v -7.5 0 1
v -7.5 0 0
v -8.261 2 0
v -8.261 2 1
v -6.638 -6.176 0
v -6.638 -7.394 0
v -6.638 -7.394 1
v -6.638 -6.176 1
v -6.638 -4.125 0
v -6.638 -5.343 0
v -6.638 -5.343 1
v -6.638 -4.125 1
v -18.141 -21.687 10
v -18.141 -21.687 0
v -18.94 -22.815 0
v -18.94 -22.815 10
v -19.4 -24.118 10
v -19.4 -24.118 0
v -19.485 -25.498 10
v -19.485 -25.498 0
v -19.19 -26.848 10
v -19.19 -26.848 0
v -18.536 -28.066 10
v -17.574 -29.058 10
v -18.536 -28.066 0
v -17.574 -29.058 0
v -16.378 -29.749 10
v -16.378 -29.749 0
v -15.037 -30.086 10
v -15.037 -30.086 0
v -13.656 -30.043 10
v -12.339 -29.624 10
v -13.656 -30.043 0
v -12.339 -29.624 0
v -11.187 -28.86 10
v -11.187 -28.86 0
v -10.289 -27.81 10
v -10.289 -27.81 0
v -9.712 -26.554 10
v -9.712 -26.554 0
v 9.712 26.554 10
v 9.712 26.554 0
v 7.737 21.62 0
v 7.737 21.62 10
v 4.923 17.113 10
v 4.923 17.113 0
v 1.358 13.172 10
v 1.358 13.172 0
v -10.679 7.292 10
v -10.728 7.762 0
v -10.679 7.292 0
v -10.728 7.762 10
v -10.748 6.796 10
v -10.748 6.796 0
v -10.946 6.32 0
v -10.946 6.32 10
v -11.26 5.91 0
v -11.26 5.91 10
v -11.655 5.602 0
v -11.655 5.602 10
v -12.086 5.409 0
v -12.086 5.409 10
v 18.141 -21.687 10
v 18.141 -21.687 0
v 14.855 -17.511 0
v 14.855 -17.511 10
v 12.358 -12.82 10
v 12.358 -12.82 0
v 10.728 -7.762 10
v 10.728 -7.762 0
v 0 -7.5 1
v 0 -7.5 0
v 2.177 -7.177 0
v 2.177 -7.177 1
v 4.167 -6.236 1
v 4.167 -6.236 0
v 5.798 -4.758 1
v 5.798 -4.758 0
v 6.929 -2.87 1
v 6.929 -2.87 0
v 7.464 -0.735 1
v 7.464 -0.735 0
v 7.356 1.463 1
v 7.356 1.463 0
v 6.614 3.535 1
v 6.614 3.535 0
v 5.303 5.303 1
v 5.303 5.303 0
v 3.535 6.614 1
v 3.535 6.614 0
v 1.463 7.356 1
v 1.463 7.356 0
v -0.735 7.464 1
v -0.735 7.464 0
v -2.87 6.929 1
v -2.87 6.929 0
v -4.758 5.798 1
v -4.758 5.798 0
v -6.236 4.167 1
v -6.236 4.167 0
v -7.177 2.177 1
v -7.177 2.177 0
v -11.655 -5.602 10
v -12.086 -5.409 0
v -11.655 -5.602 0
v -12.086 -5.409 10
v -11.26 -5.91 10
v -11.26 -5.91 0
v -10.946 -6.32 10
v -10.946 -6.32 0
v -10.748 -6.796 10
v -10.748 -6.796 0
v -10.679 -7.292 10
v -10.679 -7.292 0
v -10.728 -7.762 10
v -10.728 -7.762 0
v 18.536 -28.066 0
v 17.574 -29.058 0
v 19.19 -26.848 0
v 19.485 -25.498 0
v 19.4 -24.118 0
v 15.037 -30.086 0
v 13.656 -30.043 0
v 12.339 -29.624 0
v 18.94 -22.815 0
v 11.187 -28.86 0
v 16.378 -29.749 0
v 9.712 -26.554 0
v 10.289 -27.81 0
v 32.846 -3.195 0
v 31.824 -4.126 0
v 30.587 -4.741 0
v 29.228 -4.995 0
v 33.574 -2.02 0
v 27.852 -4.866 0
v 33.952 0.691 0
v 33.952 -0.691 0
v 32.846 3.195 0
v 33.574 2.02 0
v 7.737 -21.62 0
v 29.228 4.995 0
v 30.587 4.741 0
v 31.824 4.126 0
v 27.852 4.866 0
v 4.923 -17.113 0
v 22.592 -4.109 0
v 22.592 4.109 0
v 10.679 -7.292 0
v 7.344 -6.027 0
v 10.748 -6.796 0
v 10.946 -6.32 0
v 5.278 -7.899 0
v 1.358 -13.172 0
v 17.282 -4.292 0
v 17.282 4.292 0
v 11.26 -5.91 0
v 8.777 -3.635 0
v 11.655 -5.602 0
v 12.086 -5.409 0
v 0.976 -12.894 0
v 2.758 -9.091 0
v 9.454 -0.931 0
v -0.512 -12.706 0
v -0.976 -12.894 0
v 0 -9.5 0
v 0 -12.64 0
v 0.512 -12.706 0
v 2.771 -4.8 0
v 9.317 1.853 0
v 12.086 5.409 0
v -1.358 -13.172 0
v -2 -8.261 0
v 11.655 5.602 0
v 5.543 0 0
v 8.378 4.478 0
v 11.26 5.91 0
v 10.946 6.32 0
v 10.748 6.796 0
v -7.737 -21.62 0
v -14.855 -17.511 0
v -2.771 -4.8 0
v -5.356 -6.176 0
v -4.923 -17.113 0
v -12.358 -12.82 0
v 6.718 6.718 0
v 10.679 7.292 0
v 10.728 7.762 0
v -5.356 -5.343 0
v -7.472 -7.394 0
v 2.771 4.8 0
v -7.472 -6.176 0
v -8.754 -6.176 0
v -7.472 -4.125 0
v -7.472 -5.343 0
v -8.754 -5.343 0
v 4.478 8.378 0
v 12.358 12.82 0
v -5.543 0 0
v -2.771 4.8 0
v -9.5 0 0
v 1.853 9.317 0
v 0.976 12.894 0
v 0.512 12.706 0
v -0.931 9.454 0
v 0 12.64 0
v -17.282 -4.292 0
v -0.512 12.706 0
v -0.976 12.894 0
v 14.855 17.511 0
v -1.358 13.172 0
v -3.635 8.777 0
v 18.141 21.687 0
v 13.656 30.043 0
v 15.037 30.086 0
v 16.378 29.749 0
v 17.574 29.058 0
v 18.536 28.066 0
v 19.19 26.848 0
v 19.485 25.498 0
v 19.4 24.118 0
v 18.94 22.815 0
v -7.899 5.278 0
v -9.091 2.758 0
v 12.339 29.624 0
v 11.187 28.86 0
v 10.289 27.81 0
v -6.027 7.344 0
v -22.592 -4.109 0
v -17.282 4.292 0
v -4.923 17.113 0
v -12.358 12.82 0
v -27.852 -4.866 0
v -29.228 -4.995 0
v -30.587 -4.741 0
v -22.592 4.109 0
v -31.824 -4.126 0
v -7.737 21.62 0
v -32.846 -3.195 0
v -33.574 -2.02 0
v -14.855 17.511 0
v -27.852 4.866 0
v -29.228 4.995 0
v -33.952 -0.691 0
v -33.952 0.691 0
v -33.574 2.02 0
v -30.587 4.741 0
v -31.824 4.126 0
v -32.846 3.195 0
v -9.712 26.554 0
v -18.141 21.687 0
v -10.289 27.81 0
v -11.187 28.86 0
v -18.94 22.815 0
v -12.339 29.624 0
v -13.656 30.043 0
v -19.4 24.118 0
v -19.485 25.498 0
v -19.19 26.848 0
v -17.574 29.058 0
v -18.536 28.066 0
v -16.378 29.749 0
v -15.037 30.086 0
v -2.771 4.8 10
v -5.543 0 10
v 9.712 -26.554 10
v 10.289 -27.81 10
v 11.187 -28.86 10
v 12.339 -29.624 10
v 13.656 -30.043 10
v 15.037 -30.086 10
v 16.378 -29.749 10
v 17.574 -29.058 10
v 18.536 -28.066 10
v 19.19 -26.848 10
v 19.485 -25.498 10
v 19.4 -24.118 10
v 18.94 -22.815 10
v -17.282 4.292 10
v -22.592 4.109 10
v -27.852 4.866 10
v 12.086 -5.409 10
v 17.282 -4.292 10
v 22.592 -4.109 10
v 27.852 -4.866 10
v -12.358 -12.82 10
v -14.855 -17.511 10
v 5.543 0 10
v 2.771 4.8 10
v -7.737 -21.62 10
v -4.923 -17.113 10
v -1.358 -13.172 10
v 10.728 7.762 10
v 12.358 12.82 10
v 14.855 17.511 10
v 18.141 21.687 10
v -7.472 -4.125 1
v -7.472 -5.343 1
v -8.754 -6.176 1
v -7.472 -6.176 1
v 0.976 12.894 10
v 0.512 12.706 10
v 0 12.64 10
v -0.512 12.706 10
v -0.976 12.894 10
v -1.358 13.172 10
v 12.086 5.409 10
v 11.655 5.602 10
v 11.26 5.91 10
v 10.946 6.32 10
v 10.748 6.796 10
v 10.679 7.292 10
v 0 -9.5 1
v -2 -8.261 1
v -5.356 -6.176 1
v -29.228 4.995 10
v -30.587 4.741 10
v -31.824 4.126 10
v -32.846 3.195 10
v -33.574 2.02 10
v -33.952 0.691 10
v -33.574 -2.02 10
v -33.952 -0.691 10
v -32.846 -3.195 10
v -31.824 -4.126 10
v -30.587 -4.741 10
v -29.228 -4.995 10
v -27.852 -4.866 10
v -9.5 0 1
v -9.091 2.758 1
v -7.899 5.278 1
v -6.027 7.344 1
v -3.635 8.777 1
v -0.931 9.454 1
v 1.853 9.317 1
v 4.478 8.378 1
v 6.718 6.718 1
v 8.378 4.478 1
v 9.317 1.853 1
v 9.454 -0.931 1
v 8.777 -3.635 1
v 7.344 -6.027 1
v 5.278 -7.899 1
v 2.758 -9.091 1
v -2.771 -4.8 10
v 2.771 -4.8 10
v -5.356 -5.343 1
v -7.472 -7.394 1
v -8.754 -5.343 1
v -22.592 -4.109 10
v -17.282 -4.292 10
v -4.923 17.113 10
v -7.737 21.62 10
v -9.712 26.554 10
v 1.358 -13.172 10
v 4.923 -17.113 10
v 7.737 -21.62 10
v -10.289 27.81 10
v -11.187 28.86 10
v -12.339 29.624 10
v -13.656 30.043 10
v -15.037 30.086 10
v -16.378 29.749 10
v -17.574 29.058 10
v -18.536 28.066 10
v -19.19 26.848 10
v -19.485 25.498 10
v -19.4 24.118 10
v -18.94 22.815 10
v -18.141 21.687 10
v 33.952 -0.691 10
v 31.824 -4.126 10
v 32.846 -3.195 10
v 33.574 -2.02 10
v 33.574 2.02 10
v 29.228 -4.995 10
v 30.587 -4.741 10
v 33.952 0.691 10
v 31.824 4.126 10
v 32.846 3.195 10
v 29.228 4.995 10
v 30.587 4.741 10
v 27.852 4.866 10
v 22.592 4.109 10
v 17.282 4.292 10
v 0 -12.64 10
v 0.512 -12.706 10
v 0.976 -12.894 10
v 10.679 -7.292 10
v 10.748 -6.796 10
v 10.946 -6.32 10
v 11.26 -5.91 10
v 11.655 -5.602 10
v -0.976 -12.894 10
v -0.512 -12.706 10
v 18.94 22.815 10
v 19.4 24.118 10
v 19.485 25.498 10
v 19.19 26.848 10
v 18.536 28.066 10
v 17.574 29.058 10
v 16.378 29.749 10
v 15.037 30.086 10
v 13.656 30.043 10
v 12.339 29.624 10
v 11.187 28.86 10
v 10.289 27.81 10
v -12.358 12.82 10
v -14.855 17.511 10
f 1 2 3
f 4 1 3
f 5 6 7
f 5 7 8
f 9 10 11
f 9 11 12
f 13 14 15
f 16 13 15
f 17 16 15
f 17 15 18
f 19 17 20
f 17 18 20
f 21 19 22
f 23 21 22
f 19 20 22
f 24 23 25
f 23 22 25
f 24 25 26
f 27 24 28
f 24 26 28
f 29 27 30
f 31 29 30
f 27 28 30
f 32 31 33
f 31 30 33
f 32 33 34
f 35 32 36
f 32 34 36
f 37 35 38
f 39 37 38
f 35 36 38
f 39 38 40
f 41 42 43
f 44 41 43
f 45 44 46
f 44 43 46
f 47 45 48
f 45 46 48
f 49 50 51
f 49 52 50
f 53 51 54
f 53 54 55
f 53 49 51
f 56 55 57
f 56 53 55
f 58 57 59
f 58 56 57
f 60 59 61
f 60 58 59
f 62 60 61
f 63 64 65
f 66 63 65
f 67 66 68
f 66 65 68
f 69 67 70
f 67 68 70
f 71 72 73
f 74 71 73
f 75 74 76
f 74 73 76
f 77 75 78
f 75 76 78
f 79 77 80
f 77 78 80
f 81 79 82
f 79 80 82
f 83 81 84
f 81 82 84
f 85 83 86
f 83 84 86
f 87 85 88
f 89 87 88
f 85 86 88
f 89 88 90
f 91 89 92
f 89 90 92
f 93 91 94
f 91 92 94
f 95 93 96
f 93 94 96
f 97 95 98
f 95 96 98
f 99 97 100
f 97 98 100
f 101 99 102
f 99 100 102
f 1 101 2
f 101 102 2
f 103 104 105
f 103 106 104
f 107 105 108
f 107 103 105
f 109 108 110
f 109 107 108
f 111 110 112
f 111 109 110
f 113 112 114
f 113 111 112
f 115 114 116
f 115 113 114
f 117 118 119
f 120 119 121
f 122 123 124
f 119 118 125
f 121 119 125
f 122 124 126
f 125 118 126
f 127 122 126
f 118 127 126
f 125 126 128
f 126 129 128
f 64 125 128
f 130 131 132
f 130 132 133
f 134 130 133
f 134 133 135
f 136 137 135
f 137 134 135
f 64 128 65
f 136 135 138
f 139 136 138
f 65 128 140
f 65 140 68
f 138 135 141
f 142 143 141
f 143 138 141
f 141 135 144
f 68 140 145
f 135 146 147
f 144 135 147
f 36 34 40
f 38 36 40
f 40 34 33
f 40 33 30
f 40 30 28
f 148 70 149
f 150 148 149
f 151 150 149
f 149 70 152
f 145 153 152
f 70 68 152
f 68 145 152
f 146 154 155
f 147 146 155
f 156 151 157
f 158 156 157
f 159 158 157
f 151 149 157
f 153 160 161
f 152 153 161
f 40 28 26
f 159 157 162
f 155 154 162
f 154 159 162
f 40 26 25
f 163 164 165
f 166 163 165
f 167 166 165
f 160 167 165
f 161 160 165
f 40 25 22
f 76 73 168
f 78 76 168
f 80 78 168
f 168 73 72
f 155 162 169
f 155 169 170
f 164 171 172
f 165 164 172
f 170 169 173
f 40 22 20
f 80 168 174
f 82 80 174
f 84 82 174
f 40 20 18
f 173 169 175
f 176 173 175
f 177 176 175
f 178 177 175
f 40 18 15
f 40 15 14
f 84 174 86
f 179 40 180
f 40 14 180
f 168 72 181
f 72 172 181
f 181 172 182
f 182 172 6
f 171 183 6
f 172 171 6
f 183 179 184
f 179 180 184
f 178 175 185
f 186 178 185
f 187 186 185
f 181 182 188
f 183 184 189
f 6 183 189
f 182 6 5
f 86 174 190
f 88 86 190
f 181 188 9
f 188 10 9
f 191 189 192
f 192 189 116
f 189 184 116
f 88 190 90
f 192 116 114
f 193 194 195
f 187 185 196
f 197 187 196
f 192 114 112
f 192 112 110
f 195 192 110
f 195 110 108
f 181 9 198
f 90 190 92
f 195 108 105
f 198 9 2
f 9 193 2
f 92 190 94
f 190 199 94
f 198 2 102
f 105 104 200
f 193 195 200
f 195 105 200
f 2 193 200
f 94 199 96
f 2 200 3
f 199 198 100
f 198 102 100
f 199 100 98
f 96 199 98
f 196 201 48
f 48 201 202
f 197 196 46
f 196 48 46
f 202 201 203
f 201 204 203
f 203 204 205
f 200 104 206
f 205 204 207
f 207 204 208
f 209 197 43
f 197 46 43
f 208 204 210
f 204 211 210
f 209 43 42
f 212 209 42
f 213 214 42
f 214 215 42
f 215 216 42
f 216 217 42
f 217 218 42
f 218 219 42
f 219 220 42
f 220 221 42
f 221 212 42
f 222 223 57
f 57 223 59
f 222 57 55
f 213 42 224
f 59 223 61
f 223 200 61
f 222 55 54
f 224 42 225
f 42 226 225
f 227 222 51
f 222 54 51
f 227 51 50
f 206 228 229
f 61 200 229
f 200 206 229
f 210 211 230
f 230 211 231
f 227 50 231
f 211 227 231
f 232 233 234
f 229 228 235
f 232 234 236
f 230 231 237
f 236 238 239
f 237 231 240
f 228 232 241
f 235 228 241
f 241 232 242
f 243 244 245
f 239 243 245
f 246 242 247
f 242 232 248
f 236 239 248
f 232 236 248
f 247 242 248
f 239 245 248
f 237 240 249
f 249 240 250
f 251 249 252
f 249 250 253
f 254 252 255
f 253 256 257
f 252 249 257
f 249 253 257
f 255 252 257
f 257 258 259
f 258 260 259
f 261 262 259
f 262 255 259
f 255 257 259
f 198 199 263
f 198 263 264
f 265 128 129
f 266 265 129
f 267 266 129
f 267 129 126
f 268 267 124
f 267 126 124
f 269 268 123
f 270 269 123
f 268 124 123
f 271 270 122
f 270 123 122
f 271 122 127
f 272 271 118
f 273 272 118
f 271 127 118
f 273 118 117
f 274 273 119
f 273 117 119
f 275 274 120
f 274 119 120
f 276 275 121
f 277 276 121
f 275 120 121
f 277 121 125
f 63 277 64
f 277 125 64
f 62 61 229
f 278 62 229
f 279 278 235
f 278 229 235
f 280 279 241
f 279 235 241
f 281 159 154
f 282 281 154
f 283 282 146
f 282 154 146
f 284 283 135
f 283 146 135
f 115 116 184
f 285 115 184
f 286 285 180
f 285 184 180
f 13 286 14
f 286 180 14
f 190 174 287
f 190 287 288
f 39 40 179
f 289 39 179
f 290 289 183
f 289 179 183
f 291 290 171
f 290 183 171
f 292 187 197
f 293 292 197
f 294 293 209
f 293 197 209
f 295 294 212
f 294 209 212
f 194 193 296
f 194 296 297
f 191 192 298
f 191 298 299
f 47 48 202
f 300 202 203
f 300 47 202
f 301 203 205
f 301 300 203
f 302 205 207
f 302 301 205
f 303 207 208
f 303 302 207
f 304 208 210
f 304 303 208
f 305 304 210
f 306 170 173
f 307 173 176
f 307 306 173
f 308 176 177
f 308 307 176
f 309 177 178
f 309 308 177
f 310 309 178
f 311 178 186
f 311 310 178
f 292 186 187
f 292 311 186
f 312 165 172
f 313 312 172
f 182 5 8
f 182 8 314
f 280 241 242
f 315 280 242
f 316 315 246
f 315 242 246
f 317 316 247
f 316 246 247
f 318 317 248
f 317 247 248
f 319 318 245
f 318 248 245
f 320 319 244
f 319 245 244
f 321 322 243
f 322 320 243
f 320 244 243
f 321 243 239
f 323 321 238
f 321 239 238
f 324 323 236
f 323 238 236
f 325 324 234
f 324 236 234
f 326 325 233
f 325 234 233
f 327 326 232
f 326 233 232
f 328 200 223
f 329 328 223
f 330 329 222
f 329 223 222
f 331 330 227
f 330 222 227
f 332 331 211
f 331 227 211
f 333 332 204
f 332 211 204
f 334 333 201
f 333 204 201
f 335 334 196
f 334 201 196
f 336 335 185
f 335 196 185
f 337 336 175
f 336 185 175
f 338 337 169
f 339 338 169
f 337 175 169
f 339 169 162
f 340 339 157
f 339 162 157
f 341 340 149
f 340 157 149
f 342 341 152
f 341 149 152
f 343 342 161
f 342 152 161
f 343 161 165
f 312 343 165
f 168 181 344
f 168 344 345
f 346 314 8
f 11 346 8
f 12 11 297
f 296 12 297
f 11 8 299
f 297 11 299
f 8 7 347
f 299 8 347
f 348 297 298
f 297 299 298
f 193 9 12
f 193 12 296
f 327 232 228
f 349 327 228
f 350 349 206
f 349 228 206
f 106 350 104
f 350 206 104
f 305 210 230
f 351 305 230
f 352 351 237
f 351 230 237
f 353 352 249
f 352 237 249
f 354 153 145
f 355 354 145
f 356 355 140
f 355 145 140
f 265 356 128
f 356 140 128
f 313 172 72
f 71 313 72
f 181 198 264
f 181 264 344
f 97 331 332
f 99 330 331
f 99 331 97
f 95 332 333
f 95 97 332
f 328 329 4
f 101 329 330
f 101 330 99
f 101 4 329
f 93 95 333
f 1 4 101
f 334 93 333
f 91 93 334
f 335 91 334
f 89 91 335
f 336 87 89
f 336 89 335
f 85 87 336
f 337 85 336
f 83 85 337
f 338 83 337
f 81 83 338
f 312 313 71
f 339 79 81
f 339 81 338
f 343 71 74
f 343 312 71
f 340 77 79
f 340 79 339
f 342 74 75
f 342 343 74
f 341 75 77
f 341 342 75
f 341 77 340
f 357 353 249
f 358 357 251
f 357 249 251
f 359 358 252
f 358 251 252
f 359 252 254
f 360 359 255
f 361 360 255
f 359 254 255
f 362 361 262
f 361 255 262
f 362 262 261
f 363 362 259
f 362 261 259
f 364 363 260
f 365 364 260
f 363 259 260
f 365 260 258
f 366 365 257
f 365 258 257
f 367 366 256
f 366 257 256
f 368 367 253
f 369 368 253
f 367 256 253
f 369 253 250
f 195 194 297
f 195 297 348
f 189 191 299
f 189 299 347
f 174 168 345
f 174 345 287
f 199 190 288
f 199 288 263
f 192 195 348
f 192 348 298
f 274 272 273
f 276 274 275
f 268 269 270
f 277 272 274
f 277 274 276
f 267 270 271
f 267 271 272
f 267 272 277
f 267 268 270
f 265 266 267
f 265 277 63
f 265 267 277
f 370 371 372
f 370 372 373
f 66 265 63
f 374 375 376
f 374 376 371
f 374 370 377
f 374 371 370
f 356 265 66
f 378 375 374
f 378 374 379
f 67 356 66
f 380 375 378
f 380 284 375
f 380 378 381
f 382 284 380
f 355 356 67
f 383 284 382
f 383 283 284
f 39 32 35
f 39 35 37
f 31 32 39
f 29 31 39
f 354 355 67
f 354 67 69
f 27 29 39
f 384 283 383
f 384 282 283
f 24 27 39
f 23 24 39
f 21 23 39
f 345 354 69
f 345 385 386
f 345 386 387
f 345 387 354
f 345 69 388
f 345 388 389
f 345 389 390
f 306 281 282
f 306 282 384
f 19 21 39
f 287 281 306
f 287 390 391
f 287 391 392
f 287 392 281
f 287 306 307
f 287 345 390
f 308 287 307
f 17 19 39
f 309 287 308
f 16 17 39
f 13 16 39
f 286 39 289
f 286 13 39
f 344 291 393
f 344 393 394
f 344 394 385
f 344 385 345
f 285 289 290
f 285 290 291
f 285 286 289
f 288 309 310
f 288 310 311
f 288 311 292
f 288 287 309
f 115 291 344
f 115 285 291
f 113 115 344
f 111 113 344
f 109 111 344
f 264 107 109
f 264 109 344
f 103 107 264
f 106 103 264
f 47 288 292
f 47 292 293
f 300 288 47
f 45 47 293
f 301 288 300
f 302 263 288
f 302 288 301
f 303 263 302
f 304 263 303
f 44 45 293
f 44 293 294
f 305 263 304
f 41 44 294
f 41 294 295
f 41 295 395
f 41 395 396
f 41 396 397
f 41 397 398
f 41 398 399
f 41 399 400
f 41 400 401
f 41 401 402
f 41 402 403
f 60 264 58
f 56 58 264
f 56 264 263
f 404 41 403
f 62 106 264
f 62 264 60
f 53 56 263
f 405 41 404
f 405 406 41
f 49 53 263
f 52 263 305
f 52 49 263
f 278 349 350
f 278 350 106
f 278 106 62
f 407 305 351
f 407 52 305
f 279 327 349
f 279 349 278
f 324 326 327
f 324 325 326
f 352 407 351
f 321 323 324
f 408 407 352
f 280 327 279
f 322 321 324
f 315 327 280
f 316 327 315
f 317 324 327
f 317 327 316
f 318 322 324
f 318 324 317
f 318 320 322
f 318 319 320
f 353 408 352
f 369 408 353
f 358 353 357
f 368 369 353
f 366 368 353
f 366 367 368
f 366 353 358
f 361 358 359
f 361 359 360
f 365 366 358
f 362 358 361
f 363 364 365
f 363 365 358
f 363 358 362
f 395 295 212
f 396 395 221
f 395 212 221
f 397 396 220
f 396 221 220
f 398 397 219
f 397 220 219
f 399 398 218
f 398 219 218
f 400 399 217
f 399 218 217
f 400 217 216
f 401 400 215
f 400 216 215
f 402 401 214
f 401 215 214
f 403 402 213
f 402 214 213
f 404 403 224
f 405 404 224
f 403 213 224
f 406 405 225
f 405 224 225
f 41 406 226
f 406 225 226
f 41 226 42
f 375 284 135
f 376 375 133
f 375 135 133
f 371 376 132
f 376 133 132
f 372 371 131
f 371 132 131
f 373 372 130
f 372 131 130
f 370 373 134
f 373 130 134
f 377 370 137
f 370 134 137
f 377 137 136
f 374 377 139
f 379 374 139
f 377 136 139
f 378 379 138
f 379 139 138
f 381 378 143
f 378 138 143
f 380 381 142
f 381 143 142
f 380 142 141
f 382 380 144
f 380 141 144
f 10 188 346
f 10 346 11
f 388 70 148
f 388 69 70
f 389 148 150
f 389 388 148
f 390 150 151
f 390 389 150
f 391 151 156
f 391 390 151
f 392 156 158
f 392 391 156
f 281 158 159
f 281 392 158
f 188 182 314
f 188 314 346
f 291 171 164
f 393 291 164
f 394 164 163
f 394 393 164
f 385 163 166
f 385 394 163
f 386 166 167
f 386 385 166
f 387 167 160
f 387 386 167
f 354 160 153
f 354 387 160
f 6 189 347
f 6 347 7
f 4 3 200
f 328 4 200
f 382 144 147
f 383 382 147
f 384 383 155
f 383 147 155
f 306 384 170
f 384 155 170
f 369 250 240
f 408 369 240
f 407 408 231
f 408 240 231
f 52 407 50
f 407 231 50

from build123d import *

# Parameters (mm, degrees)
ESQUISSE1_R             = 5
ESQUISSE1_R_2           = 10
BOSS_EXTRU_1_DEPTH      = 10
CONG_1_R                = 2
ENL_V_MAT_EXTRU_1_DEPTH = 1


with BuildPart() as part:
    # Esquisse1 → Boss.-Extru.1 (new body)
    # profile 1 of 19: a face of its own
    with BuildSketch(Plane(origin=(0, 0, 0), x_dir=(0, 1, 0), z_dir=(0, 0, 1))):
        with Locations((0, -29)):
            Circle(ESQUISSE1_R)
    # profile 2 of 19: a face of its own
    with BuildSketch(Plane(origin=(0, 0, 0), x_dir=(0, 1, 0), z_dir=(0, 0, 1))):
        with BuildLine():
            ThreePointArc((5.99413543, -10.382147113), (3.146801004, -10.052477503), (0.281000689, -9.996051151))
            ThreePointArc((0.281000689, -9.996051151), (0, -10), (-0.281000689, -9.996051151))
            ThreePointArc((-0.281000689, -9.996051151), (-3.146801004, -10.052477503), (-5.99413543, -10.382147113))
            ThreePointArc((-5.99413543, -10.382147113), (-4.127637704, -19.033097235), (-4.866476509, -27.852216749))
            ThreePointArc((-4.866476509, -27.852216749), (0, -24), (4.866476509, -27.852216749))
            ThreePointArc((4.866476509, -27.852216749), (4.127637704, -19.033097235), (5.99413543, -10.382147113))
        make_face()
    # profile 3 of 19: a face of its own
    with BuildSketch(Plane(origin=(0, 0, 0), x_dir=(0, 1, 0), z_dir=(0, 0, 1))):
        with Locations((25.11473671, -14.5)):
            Circle(ESQUISSE1_R)
    # profile 4 of 19: a face of its own
    with BuildSketch(Plane(origin=(0, 0, 0), x_dir=(0, 1, 0), z_dir=(0, 0, 1))):
        with BuildLine():
            ThreePointArc((11.98827086, 0), (10.279101391, -2.301029141), (8.797334579, -4.754671841))
            ThreePointArc((8.797334579, -4.754671841), (8.660254038, -5), (8.51633389, -5.24137931))
            ThreePointArc((8.51633389, -5.24137931), (7.132300386, -7.751448362), (5.99413543, -10.382147113))
            ThreePointArc((5.99413543, -10.382147113), (14.419326866, -13.091187726), (21.687489002, -18.140600658))
            ThreePointArc((21.687489002, -18.140600658), (20.784609691, -12), (26.55396551, -9.711616091))
            ThreePointArc((26.55396551, -9.711616091), (18.54696457, -5.941909508), (11.98827086, 0))
        make_face()
    # profile 5 of 19: a face of its own
    with BuildSketch(Plane(origin=(0, 0, 0), x_dir=(0, 1, 0), z_dir=(0, 0, 1))):
        with Locations((-25.11473671, -14.5)):
            Circle(ESQUISSE1_R)
    # profile 6 of 19: a face of its own
    with BuildSketch(Plane(origin=(0, 0, 0), x_dir=(0, 1, 0), z_dir=(0, 0, 1))):
        with BuildLine():
            ThreePointArc((-5.99413543, -10.382147113), (-7.132300386, -7.751448362), (-8.51633389, -5.24137931))
            ThreePointArc((-8.51633389, -5.24137931), (-8.660254038, -5), (-8.797334579, -4.754671841))
            ThreePointArc((-8.797334579, -4.754671841), (-10.279101391, -2.301029141), (-11.98827086, 0))
            ThreePointArc((-11.98827086, 0), (-18.54696457, -5.941909508), (-26.55396551, -9.711616091))
            ThreePointArc((-26.55396551, -9.711616091), (-22.131126816, -10.487759728), (-20.11473671, -14.5))
            ThreePointArc((-20.11473671, -14.5), (-20.524734611, -16.482897055), (-21.687489002, -18.140600658))
            ThreePointArc((-21.687489002, -18.140600658), (-14.419326866, -13.091187726), (-5.99413543, -10.382147113))
        make_face()
    # profile 7 of 19: a face of its own
    with BuildSketch(Plane(origin=(0, 0, 0), x_dir=(0, 1, 0), z_dir=(0, 0, 1))):
        with BuildLine():
            ThreePointArc((-8.797334579, 4.754671841), (-8.660254038, 5), (-8.51633389, 5.24137931))
            ThreePointArc((-8.51633389, 5.24137931), (-7.132300386, 7.751448362), (-5.99413543, 10.382147113))
            ThreePointArc((-5.99413543, 10.382147113), (-14.419326866, 13.091187726), (-21.687489002, 18.140600658))
            ThreePointArc((-21.687489002, 18.140600658), (-20.524734611, 16.482897055), (-20.11473671, 14.5))
            ThreePointArc((-20.11473671, 14.5), (-22.131126816, 10.487759728), (-26.55396551, 9.711616091))
            ThreePointArc((-26.55396551, 9.711616091), (-18.54696457, 5.941909508), (-11.98827086, 0))
            ThreePointArc((-11.98827086, 0), (-10.279101391, 2.301029141), (-8.797334579, 4.754671841))
        make_face()
    # profile 8 of 19: a face of its own
    with BuildSketch(Plane(origin=(0, 0, 0), x_dir=(0, 1, 0), z_dir=(0, 0, 1))):
        with Locations((-25.11473671, 14.5)):
            Circle(ESQUISSE1_R)
    # profile 9 of 19: a face of its own
    with BuildSketch(Plane(origin=(0, 0, 0), x_dir=(0, 1, 0), z_dir=(0, 0, 1))):
        with BuildLine():
            ThreePointArc((-8.797334579, -4.754671841), (-10, 0), (-8.797334579, 4.754671841))
            ThreePointArc((-8.797334579, 4.754671841), (-10.279101391, 2.301029141), (-11.98827086, 0))
            ThreePointArc((-11.98827086, 0), (-10.279101391, -2.301029141), (-8.797334579, -4.754671841))
        make_face()
    # profile 10 of 19: a face of its own
    with BuildSketch(Plane(origin=(0, 0, 0), x_dir=(0, 1, 0), z_dir=(0, 0, 1))):
        with BuildLine():
            ThreePointArc((-5.99413543, -10.382147113), (-3.146801004, -10.052477503), (-0.281000689, -9.996051151))
            ThreePointArc((-0.281000689, -9.996051151), (-5, -8.660254038), (-8.51633389, -5.24137931))
            ThreePointArc((-8.51633389, -5.24137931), (-7.132300386, -7.751448362), (-5.99413543, -10.382147113))
        make_face()
    # profile 11 of 19: a face of its own
    with BuildSketch(Plane(origin=(0, 0, 0), x_dir=(0, 1, 0), z_dir=(0, 0, 1))):
        Circle(ESQUISSE1_R_2)
        Polygon((4.8, 2.771281292), (0, 5.542562584), (-4.8, 2.771281292), (-4.8, -2.771281292), (0, -5.542562584), (4.8, -2.771281292), align=None, mode=Mode.SUBTRACT)
    # profile 12 of 19: a face of its own
    with BuildSketch(Plane(origin=(0, 0, 0), x_dir=(0, 1, 0), z_dir=(0, 0, 1))):
        with BuildLine():
            ThreePointArc((-8.51633389, 5.24137931), (-5, 8.660254038), (-0.281000689, 9.996051151))
            ThreePointArc((-0.281000689, 9.996051151), (-3.146801004, 10.052477503), (-5.99413543, 10.382147113))
            ThreePointArc((-5.99413543, 10.382147113), (-7.132300386, 7.751448362), (-8.51633389, 5.24137931))
        make_face()
    # profile 13 of 19: a face of its own
    with BuildSketch(Plane(origin=(0, 0, 0), x_dir=(0, 1, 0), z_dir=(0, 0, 1))):
        with BuildLine():
            ThreePointArc((-0.281000689, 9.996051151), (0, 10), (0.281000689, 9.996051151))
            ThreePointArc((0.281000689, 9.996051151), (3.146801004, 10.052477503), (5.99413543, 10.382147113))
            ThreePointArc((5.99413543, 10.382147113), (4.127637704, 19.033097235), (4.866476509, 27.852216749))
            ThreePointArc((4.866476509, 27.852216749), (0, 24), (-4.866476509, 27.852216749))
            ThreePointArc((-4.866476509, 27.852216749), (-4.127637704, 19.033097235), (-5.99413543, 10.382147113))
            ThreePointArc((-5.99413543, 10.382147113), (-3.146801004, 10.052477503), (-0.281000689, 9.996051151))
        make_face()
    # profile 14 of 19: a face of its own
    with BuildSketch(Plane(origin=(0, 0, 0), x_dir=(0, 1, 0), z_dir=(0, 0, 1))):
        with BuildLine():
            ThreePointArc((8.51633389, 5.24137931), (8.660254038, 5), (8.797334579, 4.754671841))
            ThreePointArc((8.797334579, 4.754671841), (10.279101391, 2.301029141), (11.98827086, 0))
            ThreePointArc((11.98827086, 0), (18.54696457, 5.941909508), (26.55396551, 9.711616091))
            ThreePointArc((26.55396551, 9.711616091), (20.784609691, 12), (21.687489002, 18.140600658))
            ThreePointArc((21.687489002, 18.140600658), (14.419326866, 13.091187726), (5.99413543, 10.382147113))
            ThreePointArc((5.99413543, 10.382147113), (7.132300386, 7.751448362), (8.51633389, 5.24137931))
        make_face()
    # profile 15 of 19: a face of its own
    with BuildSketch(Plane(origin=(0, 0, 0), x_dir=(0, 1, 0), z_dir=(0, 0, 1))):
        with BuildLine():
            ThreePointArc((0.281000689, 9.996051151), (5, 8.660254038), (8.51633389, 5.24137931))
            ThreePointArc((8.51633389, 5.24137931), (7.132300386, 7.751448362), (5.99413543, 10.382147113))
            ThreePointArc((5.99413543, 10.382147113), (3.146801004, 10.052477503), (0.281000689, 9.996051151))
        make_face()
    # profile 16 of 19: a face of its own
    with BuildSketch(Plane(origin=(0, 0, 0), x_dir=(0, 1, 0), z_dir=(0, 0, 1))):
        with BuildLine():
            ThreePointArc((8.797334579, 4.754671841), (9.694672397, 2.452208618), (10, 0))
            ThreePointArc((10, 0), (9.694672397, -2.452208618), (8.797334579, -4.754671841))
            ThreePointArc((8.797334579, -4.754671841), (10.279101391, -2.301029141), (11.98827086, 0))
            ThreePointArc((11.98827086, 0), (10.279101391, 2.301029141), (8.797334579, 4.754671841))
        make_face()
    # profile 17 of 19: a face of its own
    with BuildSketch(Plane(origin=(0, 0, 0), x_dir=(0, 1, 0), z_dir=(0, 0, 1))):
        with BuildLine():
            ThreePointArc((5.99413543, -10.382147113), (7.132300386, -7.751448362), (8.51633389, -5.24137931))
            ThreePointArc((8.51633389, -5.24137931), (5, -8.660254038), (0.281000689, -9.996051151))
            ThreePointArc((0.281000689, -9.996051151), (3.146801004, -10.052477503), (5.99413543, -10.382147113))
        make_face()
    # profile 18 of 19: a face of its own
    with BuildSketch(Plane(origin=(0, 0, 0), x_dir=(0, 1, 0), z_dir=(0, 0, 1))):
        with Locations((25.11473671, 14.5)):
            Circle(ESQUISSE1_R)
    # profile 19 of 19: a face of its own
    with BuildSketch(Plane(origin=(0, 0, 0), x_dir=(0, 1, 0), z_dir=(0, 0, 1))):
        with Locations((0, 29)):
            Circle(ESQUISSE1_R)
    extrude(amount=BOSS_EXTRU_1_DEPTH)

    # Congé1
    cong_1_edges = [part.edges().sort_by_distance(p)[0] for p in [
        (10.382147113, 5.99413543, 5),
        (10.382147113, -5.99413543, 5),
        (0, -11.98827086, 5),
        (-10.382147113, -5.99413543, 5),
        (-10.382147113, 5.99413543, 5),
        (0, 11.98827086, 5),
    ]]
    fillet(cong_1_edges, radius=CONG_1_R)

    # Esquisse2 → Enlèv. mat.-Extru.1 (cut)
    with BuildSketch(Plane(origin=(0, 0, 0), x_dir=(1, 0, 0), z_dir=(0, 0, -1))):
        with BuildLine():
            Line((0, 9.5), (-2, 8.261355821))
            Line((-2, 8.261355821), (0, 7.5))
            ThreePointArc((0, 7.5), (5.303300859, -5.303300859), (-7.5, 0))
            Line((-7.5, 0), (-8.261355821, -2))
            Line((-8.261355821, -2), (-9.5, 0))
            ThreePointArc((-9.5, 0), (6.717514421, -6.717514421), (0, 9.5))
        make_face()
        Polygon((-7.471570722, 6.176220416), (-7.471570722, 7.394169134), (-6.638237388, 7.394169134), (-6.638237388, 6.176220416), (-5.356186106, 6.176220416), (-5.356186106, 5.342887082), (-6.638237388, 5.342887082), (-6.638237388, 4.124938365), (-7.471570722, 4.124938365), (-7.471570722, 5.342887082), (-8.753622004, 5.342887082), (-8.753622004, 6.176220416), align=None)
    extrude(amount=-ENL_V_MAT_EXTRU_1_DEPTH, mode=Mode.SUBTRACT)


solid = part.part
